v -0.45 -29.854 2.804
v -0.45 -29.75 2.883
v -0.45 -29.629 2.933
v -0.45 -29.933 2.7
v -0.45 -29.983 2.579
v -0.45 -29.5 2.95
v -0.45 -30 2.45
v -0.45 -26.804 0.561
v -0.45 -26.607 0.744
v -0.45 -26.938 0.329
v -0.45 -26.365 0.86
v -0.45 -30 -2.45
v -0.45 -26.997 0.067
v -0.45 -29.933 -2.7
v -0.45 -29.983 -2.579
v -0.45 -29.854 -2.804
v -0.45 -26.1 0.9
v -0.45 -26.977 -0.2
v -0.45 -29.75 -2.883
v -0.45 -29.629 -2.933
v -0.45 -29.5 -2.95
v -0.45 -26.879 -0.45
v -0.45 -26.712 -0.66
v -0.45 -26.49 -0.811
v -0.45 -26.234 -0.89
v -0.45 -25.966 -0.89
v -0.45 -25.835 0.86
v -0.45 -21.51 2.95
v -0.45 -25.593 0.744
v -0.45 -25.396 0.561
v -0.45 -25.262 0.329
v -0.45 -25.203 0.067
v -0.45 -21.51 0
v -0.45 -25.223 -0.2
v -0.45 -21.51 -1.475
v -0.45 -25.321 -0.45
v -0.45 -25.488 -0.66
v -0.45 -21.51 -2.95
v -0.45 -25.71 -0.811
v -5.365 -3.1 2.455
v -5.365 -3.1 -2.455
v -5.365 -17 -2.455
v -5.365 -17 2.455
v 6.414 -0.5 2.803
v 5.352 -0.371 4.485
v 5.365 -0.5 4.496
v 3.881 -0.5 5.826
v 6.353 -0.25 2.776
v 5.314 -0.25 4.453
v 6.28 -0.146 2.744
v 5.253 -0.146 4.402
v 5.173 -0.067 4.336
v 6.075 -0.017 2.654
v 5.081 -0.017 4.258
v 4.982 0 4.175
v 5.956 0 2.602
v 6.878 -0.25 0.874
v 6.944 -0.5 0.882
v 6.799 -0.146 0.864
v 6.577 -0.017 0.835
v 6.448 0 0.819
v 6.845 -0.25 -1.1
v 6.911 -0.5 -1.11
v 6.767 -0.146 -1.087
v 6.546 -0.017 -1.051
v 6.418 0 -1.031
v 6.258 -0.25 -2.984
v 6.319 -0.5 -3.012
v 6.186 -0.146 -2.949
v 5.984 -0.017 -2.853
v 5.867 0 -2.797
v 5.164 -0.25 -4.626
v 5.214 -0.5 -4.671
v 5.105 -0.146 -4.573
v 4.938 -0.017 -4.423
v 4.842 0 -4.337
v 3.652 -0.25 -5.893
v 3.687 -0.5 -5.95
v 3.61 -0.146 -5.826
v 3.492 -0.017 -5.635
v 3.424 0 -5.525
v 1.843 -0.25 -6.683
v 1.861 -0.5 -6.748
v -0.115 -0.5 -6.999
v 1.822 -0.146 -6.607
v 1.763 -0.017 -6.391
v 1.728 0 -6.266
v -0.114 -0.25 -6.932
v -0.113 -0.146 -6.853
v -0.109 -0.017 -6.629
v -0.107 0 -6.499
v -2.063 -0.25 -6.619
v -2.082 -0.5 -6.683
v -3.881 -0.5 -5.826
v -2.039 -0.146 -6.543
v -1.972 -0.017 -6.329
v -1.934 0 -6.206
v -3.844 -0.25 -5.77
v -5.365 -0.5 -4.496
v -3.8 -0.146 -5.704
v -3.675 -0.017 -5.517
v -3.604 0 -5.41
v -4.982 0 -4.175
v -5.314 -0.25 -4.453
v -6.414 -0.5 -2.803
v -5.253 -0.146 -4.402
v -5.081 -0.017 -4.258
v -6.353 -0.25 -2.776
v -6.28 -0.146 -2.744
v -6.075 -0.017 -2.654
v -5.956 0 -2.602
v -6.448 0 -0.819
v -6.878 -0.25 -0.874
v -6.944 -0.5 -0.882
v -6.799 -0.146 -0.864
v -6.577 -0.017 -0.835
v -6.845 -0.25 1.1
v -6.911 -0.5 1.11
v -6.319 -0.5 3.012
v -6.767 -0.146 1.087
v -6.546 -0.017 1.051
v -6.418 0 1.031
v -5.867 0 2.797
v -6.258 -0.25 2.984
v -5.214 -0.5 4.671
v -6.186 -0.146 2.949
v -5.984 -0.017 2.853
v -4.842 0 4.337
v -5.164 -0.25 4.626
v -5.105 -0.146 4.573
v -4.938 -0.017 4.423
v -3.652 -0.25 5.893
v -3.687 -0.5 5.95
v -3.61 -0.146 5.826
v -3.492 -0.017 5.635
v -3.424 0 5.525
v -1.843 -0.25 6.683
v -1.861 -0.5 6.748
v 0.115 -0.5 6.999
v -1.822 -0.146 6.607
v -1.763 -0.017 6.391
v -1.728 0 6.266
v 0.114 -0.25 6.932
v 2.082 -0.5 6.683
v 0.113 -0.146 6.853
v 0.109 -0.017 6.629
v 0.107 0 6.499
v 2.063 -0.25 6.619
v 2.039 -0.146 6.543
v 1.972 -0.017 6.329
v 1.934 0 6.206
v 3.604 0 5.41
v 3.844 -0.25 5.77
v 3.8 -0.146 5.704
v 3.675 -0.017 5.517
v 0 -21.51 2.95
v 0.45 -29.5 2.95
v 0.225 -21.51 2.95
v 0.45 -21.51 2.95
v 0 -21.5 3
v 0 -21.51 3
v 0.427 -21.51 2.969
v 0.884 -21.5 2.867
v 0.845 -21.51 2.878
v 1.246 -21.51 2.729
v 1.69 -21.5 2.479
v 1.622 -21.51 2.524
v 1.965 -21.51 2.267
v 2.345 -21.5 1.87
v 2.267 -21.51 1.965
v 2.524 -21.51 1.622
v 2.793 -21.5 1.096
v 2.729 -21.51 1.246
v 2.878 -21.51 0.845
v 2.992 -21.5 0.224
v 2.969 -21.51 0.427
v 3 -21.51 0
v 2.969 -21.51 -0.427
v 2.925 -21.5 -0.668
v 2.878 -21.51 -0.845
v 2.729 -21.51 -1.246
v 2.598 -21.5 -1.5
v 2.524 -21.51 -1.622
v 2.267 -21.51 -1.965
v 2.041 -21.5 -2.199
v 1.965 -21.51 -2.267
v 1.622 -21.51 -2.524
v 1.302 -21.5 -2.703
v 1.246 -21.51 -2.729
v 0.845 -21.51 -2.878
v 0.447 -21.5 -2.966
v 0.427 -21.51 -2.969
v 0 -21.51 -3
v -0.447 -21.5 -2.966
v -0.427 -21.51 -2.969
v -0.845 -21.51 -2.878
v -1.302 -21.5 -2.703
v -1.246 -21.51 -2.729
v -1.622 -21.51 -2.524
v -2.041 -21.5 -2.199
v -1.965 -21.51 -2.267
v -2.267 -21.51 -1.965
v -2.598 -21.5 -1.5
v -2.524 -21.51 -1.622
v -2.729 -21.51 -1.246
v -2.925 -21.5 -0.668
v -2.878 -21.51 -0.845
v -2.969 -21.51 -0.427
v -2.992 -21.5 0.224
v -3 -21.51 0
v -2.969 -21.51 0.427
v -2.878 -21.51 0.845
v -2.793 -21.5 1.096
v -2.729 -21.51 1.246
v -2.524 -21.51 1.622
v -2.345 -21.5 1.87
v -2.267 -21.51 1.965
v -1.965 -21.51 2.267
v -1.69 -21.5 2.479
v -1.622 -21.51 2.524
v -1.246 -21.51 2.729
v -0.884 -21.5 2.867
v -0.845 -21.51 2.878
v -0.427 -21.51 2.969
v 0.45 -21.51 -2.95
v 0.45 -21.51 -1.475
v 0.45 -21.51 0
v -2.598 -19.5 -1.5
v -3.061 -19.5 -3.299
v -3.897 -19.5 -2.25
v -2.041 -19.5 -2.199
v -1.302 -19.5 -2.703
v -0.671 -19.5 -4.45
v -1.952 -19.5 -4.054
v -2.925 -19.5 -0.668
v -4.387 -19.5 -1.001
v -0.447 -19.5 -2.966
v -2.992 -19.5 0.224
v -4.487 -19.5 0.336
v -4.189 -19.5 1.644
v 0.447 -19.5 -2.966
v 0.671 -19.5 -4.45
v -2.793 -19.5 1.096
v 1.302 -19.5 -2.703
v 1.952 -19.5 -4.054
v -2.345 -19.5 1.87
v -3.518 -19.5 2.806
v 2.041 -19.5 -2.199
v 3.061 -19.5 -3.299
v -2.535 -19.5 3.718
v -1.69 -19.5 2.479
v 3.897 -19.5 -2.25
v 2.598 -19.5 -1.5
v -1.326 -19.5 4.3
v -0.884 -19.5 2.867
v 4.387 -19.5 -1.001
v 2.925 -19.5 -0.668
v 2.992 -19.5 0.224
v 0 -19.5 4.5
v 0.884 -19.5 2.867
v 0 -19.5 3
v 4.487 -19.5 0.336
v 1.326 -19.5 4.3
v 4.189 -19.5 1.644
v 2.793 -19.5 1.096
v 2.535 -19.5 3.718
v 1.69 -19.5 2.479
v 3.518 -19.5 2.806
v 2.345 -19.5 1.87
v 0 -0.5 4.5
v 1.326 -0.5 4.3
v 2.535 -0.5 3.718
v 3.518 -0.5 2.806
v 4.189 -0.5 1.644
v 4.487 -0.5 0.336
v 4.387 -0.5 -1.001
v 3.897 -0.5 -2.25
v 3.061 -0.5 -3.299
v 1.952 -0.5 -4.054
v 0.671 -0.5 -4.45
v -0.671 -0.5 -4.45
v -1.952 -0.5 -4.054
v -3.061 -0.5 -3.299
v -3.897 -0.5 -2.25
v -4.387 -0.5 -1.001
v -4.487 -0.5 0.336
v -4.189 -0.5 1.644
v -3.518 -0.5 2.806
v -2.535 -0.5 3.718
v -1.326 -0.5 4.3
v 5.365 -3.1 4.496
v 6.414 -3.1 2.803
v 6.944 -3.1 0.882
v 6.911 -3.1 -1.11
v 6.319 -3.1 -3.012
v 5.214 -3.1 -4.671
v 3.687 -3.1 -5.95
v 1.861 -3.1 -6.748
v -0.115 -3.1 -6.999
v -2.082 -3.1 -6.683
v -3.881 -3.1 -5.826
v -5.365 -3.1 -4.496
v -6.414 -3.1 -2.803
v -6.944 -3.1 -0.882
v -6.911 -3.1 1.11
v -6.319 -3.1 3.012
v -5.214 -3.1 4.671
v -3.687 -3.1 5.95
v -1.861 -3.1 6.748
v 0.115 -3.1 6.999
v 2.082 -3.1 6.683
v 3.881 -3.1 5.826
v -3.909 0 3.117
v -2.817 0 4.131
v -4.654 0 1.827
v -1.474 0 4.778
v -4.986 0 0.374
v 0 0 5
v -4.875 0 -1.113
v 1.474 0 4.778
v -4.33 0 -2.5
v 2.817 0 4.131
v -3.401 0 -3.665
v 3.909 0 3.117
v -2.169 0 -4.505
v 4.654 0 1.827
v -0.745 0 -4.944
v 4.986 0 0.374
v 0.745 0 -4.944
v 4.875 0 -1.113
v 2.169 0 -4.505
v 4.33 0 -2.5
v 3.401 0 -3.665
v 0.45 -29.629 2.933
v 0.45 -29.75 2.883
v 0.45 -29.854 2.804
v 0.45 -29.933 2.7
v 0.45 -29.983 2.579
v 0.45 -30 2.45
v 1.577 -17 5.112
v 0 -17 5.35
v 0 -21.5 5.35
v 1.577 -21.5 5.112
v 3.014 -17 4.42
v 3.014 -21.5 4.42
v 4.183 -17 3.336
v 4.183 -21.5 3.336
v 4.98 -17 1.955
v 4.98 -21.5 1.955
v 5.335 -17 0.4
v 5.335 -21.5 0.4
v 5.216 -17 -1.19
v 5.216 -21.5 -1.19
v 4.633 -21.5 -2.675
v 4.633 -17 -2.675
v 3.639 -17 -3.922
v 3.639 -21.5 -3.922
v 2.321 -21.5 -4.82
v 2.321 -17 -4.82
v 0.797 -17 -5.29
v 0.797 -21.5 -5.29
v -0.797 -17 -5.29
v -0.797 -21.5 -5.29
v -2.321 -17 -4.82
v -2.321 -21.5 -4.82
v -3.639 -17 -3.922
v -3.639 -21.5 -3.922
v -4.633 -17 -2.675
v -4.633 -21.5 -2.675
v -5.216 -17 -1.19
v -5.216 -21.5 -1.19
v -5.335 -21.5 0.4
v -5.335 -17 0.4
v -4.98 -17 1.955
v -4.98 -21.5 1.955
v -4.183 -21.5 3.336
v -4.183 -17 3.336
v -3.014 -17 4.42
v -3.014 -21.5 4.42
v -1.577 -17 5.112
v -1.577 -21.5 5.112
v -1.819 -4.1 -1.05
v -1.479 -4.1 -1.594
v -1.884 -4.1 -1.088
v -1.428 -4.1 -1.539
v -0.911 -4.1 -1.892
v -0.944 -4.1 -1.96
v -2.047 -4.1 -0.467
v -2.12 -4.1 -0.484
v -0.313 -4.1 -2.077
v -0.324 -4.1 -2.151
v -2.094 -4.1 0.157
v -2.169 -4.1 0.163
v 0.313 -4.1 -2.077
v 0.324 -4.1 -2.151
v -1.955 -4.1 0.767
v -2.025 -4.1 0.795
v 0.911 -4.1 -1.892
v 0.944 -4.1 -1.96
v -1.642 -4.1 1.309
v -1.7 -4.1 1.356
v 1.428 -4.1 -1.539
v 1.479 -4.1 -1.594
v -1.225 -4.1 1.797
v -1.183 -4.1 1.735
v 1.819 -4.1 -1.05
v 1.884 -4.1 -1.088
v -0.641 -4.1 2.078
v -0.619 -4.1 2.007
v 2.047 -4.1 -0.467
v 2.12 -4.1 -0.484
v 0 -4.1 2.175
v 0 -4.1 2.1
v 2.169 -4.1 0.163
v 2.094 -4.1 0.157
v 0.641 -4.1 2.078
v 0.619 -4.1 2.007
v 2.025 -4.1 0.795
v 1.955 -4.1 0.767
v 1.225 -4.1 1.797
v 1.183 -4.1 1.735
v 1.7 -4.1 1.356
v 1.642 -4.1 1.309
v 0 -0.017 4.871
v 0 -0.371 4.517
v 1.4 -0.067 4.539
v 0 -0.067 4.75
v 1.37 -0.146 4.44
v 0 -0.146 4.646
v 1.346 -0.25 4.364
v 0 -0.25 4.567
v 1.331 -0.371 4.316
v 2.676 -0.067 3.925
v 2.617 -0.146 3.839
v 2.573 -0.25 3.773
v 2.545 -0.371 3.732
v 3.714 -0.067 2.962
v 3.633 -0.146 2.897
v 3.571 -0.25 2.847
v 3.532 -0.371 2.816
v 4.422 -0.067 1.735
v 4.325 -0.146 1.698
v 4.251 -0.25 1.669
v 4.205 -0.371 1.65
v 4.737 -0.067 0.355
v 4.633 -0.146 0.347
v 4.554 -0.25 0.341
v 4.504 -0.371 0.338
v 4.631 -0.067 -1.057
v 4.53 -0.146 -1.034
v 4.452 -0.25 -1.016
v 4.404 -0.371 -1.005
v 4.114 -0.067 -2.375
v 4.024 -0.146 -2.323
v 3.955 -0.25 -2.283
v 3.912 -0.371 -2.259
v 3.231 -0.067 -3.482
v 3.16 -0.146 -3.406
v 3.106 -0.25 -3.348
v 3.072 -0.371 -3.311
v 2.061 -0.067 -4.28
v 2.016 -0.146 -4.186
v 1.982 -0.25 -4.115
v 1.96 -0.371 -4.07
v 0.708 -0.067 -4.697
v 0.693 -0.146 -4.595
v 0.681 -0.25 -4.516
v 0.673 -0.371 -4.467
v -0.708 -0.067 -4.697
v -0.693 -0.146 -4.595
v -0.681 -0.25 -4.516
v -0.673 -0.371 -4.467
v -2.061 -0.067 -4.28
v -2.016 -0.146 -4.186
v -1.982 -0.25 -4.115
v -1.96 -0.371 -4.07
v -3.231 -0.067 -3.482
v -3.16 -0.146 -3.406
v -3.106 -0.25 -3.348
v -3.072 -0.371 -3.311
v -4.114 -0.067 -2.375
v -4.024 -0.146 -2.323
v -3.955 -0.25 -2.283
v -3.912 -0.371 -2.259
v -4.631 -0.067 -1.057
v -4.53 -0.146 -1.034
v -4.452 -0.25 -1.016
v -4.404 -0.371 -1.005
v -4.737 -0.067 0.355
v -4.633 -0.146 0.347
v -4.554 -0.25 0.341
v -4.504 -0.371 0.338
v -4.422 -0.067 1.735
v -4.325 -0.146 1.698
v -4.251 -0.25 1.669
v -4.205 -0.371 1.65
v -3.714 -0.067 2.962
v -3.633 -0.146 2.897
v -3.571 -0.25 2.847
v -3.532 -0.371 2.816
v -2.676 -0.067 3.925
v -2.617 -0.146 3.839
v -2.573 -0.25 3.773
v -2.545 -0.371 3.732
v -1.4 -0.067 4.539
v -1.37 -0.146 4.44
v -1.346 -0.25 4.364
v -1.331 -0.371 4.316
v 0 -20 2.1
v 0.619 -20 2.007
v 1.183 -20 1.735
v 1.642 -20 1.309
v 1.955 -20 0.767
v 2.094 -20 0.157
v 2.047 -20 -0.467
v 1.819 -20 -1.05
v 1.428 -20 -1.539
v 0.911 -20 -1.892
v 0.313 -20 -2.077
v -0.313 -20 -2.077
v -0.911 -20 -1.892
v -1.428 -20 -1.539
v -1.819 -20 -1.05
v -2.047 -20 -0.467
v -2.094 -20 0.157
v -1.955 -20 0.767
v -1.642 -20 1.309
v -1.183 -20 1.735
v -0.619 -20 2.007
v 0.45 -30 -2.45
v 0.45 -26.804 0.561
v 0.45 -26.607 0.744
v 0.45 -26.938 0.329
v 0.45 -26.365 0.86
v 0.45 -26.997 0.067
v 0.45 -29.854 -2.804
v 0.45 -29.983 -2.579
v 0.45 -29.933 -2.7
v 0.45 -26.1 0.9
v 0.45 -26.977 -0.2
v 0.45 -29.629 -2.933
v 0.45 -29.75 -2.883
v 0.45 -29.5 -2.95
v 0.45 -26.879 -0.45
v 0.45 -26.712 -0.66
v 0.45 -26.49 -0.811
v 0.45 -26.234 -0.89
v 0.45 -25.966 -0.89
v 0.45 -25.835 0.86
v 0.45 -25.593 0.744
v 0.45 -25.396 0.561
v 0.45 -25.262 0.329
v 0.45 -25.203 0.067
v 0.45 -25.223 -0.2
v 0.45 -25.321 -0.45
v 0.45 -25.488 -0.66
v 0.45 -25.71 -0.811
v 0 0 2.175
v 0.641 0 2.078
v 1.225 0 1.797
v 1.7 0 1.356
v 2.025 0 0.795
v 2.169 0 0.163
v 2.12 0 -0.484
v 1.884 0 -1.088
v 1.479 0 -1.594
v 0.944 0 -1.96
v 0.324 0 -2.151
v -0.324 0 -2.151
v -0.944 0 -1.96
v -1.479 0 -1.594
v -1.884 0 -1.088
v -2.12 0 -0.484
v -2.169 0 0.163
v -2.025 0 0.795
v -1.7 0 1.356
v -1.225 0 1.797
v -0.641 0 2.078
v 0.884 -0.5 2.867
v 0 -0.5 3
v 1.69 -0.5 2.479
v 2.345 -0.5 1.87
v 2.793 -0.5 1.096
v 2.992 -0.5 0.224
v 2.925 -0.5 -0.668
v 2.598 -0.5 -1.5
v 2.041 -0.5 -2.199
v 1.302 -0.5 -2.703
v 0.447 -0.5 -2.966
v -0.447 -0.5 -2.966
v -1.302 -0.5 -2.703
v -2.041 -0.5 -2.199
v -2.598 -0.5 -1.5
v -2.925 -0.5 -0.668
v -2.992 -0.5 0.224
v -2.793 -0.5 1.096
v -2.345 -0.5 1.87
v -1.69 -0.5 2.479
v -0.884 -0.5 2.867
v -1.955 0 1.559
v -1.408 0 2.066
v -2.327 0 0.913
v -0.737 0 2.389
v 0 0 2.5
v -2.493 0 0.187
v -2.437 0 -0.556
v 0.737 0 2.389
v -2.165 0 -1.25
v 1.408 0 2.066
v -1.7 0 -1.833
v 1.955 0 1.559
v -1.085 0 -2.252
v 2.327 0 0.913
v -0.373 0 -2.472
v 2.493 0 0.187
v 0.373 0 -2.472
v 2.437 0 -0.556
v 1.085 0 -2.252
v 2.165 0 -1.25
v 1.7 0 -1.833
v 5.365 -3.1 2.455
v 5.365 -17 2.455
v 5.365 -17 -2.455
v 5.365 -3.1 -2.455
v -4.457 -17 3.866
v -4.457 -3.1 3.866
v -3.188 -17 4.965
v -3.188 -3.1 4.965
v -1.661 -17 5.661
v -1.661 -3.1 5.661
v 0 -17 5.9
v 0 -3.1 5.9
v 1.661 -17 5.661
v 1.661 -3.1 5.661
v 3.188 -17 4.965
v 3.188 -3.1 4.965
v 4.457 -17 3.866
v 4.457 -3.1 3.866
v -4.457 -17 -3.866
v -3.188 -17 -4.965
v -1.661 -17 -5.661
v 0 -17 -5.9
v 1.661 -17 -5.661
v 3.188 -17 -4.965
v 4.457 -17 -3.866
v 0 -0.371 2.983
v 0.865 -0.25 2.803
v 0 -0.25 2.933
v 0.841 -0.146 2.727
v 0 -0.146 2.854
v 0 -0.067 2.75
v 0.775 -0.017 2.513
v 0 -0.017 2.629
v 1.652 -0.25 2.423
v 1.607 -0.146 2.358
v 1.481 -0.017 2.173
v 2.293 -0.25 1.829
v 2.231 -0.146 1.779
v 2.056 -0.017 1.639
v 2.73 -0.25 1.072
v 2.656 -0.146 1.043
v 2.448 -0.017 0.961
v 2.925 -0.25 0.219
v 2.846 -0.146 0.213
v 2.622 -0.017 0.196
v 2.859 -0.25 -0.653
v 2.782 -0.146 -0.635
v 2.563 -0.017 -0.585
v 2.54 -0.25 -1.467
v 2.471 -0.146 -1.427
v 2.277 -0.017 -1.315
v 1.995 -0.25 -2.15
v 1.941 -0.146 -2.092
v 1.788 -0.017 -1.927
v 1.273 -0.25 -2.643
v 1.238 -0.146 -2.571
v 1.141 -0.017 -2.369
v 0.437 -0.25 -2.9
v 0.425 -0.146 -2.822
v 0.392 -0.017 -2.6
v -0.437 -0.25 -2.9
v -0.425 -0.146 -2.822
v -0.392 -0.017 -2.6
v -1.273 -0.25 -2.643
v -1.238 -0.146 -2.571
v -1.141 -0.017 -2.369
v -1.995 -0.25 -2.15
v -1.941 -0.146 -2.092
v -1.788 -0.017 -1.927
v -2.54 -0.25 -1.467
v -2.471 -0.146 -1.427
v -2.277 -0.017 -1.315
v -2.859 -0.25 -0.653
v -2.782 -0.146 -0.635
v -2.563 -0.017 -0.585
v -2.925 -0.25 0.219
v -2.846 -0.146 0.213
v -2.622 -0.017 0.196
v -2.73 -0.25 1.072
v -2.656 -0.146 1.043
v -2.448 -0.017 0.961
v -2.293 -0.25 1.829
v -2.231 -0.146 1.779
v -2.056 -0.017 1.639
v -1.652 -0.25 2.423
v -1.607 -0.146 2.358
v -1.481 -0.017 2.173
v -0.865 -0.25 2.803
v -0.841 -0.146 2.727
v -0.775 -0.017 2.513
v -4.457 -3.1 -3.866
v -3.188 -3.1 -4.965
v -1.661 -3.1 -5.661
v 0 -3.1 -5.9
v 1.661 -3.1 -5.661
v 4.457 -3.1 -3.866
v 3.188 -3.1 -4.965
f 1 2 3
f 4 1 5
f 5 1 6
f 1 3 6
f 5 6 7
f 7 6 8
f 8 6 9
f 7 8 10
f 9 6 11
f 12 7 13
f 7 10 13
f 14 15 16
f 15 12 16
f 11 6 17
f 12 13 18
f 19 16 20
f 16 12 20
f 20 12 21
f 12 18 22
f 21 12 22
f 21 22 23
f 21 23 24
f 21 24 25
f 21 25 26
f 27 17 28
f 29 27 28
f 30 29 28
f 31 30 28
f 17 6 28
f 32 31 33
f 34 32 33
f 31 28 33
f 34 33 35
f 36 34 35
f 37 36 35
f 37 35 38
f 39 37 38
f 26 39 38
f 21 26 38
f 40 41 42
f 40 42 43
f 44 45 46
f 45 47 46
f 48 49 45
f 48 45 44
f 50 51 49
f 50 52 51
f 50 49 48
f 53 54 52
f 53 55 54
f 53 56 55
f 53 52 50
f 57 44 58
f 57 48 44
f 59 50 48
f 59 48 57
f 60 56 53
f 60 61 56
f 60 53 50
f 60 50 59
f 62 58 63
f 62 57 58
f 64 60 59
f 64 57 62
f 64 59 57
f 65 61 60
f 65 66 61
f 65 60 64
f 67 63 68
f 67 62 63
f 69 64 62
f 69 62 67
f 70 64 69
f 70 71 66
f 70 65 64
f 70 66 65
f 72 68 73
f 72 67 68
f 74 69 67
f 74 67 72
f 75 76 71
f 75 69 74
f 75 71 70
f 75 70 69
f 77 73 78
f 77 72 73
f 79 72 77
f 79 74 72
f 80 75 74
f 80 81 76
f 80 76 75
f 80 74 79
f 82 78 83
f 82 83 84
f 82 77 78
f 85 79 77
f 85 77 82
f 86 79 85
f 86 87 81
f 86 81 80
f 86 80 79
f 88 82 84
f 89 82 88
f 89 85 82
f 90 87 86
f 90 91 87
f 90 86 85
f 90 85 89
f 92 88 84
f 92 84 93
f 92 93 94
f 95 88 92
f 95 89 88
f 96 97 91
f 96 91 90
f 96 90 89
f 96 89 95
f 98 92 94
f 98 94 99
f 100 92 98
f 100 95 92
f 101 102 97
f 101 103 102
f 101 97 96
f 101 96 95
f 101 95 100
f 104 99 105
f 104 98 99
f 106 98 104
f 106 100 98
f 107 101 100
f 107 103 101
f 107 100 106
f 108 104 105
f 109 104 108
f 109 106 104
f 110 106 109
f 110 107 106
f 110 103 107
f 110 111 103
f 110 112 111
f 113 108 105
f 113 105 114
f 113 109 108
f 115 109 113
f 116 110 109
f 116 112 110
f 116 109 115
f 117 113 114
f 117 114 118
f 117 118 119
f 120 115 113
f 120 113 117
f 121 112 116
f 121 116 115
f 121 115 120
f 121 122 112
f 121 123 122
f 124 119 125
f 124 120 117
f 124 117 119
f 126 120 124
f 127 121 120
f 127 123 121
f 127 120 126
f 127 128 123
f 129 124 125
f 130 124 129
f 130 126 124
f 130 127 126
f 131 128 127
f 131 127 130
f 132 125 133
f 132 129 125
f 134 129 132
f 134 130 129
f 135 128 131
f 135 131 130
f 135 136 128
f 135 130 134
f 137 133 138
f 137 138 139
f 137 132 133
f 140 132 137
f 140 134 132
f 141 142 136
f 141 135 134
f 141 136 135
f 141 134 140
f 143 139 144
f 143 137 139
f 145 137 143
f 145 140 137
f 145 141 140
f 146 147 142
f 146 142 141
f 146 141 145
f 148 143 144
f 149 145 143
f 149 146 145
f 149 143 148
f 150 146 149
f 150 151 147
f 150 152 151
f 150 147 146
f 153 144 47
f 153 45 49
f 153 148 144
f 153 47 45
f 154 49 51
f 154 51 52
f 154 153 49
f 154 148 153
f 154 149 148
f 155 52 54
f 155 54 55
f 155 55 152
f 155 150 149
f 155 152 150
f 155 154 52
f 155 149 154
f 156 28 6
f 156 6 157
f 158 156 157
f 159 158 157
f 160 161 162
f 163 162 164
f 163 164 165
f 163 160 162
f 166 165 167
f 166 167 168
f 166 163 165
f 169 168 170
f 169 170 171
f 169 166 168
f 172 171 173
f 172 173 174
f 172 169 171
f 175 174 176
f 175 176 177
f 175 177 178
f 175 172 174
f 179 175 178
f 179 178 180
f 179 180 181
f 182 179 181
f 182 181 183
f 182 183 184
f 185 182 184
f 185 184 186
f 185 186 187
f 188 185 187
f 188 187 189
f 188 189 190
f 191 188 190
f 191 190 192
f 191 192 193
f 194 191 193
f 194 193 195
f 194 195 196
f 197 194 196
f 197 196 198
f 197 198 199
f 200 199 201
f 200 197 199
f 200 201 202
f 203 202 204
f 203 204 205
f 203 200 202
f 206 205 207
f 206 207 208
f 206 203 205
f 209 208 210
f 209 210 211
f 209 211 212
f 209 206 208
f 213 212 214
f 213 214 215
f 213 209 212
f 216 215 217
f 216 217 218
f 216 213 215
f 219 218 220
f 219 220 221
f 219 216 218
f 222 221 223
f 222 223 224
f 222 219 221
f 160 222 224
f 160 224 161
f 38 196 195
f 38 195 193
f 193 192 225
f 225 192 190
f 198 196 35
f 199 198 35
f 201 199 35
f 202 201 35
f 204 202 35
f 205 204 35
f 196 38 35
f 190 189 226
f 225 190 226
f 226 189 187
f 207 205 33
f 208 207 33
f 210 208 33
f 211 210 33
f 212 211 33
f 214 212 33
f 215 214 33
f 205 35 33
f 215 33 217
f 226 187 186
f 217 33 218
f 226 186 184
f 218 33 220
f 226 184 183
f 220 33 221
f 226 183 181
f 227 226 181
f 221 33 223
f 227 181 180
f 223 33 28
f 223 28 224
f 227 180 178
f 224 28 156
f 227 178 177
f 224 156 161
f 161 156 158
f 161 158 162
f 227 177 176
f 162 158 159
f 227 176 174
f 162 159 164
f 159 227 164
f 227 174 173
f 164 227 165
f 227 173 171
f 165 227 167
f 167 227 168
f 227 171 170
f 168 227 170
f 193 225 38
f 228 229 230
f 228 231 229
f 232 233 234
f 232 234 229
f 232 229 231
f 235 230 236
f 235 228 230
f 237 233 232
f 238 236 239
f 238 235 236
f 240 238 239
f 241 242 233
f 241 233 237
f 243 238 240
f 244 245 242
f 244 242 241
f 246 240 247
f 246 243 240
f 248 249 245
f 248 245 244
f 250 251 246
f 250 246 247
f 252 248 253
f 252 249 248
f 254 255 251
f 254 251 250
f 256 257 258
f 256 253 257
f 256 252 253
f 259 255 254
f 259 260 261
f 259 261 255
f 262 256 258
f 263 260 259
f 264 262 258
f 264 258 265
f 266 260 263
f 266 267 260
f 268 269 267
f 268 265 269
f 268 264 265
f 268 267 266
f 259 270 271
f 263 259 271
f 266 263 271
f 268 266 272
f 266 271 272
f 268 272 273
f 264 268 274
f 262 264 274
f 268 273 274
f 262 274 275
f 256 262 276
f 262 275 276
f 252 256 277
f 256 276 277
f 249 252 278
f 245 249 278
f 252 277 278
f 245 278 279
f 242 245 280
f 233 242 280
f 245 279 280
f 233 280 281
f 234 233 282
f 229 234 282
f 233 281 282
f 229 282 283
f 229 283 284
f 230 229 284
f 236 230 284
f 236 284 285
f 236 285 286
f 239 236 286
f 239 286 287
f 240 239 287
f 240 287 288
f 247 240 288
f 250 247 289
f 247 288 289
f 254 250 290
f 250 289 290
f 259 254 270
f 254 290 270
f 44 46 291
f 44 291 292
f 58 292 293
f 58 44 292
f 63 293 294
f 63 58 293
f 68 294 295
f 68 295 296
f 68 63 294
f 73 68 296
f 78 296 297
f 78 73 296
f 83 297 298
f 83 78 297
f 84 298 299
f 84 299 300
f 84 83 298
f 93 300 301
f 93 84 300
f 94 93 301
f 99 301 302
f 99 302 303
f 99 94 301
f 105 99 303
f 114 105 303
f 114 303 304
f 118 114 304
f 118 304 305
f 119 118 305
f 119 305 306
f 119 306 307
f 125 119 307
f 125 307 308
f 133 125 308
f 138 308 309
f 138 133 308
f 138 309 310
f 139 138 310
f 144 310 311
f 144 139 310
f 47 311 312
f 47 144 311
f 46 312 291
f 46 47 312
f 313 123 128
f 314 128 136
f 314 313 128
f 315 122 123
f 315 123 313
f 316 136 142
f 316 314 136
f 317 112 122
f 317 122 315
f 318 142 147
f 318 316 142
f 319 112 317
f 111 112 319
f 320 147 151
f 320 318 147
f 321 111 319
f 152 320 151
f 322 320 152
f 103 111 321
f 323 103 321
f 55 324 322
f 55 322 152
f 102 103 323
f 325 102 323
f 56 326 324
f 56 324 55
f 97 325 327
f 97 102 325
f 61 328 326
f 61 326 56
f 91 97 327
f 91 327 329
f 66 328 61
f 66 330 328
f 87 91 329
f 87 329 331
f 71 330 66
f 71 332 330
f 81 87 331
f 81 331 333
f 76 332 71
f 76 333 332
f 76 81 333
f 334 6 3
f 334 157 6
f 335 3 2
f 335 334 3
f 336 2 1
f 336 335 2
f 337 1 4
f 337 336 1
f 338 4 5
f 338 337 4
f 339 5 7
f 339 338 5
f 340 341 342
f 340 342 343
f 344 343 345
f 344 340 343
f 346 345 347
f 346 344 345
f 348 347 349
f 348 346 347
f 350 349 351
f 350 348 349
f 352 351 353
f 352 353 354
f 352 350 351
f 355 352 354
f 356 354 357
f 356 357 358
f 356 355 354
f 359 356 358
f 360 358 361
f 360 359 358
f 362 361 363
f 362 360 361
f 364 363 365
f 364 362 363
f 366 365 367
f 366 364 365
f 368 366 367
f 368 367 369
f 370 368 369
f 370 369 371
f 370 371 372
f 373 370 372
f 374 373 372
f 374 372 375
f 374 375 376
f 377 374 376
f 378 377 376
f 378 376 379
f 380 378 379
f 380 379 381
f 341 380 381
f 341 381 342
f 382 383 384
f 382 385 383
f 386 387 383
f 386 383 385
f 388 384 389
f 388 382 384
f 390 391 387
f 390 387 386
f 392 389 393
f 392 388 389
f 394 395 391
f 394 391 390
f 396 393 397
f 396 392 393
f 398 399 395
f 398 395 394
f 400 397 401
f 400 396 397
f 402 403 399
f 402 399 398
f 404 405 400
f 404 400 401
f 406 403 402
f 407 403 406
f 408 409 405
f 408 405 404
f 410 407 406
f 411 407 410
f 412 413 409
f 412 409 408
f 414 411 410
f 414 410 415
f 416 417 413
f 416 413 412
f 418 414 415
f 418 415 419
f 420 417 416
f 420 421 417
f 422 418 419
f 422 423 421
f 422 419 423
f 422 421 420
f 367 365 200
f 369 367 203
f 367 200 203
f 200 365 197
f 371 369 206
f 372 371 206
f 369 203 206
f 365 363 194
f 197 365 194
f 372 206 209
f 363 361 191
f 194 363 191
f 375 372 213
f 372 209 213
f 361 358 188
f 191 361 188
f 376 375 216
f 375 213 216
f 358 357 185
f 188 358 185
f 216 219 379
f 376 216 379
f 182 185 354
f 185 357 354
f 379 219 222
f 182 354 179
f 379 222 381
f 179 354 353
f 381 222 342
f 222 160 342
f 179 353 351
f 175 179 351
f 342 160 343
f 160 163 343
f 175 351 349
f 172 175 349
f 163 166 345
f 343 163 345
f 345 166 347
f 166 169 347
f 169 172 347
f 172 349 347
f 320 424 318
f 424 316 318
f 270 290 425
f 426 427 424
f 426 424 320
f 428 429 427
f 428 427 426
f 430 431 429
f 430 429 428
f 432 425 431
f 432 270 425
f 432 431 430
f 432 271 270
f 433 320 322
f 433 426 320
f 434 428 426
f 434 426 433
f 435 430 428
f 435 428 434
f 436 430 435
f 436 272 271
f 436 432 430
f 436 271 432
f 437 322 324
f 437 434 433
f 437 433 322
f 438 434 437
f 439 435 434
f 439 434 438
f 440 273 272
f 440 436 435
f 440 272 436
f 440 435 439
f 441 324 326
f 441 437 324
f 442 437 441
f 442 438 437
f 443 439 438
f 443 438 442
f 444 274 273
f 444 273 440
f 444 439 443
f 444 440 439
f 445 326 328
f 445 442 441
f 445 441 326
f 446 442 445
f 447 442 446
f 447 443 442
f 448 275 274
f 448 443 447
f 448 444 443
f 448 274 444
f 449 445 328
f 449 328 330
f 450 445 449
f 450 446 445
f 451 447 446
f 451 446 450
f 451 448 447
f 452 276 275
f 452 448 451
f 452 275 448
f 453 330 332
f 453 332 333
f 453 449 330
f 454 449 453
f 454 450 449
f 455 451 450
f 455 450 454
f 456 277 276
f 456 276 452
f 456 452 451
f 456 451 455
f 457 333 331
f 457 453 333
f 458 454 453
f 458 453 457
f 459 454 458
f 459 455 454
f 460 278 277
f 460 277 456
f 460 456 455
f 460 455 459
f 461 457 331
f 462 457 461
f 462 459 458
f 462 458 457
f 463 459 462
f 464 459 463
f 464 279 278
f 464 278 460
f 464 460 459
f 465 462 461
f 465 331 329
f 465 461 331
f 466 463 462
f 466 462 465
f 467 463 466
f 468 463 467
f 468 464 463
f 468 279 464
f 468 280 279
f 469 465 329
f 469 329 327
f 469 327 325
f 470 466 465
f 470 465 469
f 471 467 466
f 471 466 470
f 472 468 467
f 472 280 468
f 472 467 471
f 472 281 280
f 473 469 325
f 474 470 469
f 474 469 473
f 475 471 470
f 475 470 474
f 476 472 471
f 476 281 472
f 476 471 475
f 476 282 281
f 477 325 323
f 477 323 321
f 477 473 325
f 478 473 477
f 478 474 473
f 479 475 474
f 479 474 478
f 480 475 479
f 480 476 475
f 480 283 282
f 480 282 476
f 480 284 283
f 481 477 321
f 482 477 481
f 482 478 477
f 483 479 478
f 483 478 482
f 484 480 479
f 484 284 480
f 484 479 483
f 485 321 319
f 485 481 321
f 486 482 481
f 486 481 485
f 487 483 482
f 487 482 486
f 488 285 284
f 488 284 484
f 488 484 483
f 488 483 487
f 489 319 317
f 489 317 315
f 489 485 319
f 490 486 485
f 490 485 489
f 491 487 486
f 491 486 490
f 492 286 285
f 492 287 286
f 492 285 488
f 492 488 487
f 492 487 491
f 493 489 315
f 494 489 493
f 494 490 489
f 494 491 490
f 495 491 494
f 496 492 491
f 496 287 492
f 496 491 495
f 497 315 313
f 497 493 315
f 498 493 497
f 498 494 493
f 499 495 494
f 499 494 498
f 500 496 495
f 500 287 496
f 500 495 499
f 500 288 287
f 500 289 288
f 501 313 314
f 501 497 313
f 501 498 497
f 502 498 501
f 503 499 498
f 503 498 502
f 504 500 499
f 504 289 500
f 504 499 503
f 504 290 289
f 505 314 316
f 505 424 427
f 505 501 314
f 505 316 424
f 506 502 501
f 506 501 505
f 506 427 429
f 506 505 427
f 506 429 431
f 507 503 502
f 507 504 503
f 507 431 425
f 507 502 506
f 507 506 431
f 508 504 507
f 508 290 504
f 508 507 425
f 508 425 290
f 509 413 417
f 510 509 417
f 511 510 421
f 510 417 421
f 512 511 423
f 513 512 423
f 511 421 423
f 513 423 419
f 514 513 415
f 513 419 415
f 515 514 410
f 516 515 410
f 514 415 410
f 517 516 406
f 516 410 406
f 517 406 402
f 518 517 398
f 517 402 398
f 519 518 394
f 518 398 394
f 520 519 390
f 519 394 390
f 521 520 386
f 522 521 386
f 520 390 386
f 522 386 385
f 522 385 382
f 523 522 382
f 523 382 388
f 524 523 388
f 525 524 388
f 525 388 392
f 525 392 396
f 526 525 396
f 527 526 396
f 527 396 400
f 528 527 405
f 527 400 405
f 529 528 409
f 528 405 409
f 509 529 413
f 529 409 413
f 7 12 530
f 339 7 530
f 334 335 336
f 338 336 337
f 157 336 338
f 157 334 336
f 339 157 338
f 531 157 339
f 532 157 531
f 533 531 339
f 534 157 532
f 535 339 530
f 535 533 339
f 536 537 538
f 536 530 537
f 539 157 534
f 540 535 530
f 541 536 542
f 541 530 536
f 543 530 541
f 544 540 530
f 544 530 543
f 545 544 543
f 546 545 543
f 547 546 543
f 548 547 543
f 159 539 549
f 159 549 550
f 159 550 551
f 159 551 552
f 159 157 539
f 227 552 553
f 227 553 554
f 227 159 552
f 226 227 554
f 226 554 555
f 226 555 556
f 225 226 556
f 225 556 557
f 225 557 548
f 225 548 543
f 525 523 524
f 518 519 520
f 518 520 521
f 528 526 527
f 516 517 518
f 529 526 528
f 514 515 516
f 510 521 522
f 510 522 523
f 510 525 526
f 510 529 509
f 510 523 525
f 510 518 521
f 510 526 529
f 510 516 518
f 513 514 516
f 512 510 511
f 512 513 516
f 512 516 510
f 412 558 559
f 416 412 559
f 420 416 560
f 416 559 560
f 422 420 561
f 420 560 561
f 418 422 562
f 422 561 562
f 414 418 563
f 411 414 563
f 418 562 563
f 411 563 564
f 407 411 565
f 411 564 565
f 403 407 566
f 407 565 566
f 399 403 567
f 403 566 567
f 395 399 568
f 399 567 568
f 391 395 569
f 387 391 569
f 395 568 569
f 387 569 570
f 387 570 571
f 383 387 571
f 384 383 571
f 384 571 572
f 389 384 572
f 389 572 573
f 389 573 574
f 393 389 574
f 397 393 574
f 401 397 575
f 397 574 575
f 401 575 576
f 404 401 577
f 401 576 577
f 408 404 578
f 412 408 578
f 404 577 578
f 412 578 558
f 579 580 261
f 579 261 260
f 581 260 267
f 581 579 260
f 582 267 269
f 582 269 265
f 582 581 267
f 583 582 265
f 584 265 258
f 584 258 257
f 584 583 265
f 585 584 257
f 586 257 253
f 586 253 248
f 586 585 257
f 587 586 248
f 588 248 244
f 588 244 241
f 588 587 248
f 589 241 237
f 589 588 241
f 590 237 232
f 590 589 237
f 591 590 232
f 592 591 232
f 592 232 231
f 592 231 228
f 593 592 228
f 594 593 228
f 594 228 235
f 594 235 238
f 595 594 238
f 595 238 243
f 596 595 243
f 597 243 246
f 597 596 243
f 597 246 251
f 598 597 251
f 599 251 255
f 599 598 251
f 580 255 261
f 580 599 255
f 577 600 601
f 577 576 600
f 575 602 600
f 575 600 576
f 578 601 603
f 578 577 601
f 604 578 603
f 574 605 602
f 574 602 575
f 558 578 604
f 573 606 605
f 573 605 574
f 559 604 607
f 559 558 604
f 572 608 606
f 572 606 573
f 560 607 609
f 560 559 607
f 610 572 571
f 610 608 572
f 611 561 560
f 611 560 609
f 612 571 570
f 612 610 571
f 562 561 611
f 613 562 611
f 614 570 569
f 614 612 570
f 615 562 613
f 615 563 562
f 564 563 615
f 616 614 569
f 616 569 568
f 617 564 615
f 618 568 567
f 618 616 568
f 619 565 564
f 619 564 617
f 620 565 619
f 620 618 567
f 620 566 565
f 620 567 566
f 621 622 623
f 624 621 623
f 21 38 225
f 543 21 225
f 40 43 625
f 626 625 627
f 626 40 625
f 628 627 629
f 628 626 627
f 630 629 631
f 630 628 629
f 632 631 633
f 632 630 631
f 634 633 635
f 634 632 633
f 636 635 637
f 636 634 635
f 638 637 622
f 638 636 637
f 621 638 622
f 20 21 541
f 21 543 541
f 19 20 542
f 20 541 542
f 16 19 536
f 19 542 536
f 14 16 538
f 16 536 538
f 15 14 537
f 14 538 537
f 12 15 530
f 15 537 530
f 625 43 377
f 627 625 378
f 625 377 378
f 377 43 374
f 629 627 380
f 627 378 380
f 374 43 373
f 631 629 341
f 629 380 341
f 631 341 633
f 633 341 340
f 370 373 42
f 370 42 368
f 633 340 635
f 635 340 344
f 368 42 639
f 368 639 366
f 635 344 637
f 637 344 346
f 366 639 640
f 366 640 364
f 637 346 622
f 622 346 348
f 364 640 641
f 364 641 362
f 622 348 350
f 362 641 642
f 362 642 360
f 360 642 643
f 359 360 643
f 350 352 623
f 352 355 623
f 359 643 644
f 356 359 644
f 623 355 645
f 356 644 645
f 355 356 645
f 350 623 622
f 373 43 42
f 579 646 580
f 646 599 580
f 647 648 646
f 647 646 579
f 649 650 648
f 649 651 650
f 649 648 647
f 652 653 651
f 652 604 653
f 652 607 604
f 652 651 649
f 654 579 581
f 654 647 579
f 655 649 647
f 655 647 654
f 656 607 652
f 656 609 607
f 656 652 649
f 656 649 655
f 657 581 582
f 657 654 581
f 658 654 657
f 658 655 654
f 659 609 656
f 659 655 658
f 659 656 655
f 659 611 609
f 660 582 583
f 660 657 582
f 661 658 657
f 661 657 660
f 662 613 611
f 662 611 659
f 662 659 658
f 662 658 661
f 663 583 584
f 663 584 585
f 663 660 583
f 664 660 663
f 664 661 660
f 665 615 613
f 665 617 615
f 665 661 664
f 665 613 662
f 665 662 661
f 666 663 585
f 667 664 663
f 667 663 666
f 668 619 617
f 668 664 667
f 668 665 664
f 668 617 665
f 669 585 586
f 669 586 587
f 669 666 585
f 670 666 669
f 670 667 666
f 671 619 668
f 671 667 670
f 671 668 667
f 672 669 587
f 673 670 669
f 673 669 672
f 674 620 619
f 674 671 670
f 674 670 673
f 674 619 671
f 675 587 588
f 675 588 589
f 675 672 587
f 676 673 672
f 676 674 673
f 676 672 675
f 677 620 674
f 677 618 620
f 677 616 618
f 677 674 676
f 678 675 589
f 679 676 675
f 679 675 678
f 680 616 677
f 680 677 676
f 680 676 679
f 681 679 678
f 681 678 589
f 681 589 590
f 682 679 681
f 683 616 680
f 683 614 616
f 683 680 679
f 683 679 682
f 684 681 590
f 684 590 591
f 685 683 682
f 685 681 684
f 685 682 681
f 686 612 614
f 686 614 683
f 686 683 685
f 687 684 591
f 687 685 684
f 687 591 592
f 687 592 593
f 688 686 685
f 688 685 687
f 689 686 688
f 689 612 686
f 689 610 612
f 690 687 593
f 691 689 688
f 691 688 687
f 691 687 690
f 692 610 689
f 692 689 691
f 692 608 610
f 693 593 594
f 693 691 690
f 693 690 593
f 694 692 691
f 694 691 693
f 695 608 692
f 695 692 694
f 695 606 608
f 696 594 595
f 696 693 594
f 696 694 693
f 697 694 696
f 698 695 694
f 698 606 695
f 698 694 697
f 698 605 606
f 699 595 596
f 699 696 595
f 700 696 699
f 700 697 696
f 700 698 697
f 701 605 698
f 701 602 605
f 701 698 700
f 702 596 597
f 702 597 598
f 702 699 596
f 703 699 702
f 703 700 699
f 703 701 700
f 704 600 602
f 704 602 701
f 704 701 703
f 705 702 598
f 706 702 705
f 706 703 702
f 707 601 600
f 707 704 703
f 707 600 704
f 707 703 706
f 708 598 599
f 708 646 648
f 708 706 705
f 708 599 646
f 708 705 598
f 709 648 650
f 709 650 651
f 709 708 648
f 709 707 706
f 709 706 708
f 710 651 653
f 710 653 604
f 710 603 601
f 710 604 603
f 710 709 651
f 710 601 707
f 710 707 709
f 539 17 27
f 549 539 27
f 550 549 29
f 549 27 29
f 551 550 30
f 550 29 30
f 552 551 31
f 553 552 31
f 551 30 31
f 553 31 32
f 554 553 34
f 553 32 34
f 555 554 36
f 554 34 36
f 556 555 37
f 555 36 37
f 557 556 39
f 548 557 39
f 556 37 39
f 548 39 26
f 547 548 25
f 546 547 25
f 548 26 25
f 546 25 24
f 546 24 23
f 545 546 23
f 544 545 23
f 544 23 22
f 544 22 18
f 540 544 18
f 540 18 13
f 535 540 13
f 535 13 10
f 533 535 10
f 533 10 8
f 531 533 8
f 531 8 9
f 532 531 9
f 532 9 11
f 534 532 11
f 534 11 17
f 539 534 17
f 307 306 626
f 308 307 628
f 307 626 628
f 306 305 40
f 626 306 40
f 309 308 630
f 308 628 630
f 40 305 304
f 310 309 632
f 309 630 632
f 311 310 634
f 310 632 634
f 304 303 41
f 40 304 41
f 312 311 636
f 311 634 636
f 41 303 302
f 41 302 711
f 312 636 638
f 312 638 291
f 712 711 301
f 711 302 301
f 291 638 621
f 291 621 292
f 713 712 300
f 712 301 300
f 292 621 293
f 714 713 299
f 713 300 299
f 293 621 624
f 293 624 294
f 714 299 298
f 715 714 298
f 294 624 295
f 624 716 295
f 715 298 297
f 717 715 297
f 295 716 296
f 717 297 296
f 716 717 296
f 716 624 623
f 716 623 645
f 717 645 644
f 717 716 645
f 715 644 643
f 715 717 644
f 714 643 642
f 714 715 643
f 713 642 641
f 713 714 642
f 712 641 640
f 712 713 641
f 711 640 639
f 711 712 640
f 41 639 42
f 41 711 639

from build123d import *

# Parameters (mm, degrees)
SKETCH1_W           = 0.9
SKETCH1_H           = 5.9
BOSS_EXTRUDE1_DEPTH = 30
SKETCH1_3_R         = 3
SKETCH1_3_W         = 0.9
SKETCH1_3_H         = 5.9
BOSS_EXTRUDE2_DEPTH = 21.51
SKETCH1_4_R         = 5.35
SKETCH1_4_R_2       = 3
BOSS_EXTRUDE3_DEPTH = 21.5
SKETCH1_5_R         = 5.35
BOSS_EXTRUDE4_DEPTH = 17
SKETCH1_6_R         = 7
BOSS_EXTRUDE5_DEPTH = 3.1
SKETCH2_R           = 4.5
SKETCH2_R_2         = 3
CUT_EXTRUDE1_DEPTH  = 19.5
SKETCH3_R           = 2.175
CUT_EXTRUDE2_DEPTH  = 4.1
SKETCH4_R           = 2.1
CUT_EXTRUDE3_DEPTH  = 15.9
SKETCH5_R           = 0.9
CUT_EXTRUDE4_DEPTH  = 32.693887423
FILLET1_R           = 0.5


with BuildPart() as part:
    # Sketch1 → Boss-Extrude1 (new body)
    with BuildSketch(Plane(origin=(0, 0, 0), x_dir=(1, 0, 0), z_dir=(0, 1, 0))):
        Rectangle(SKETCH1_W, SKETCH1_H)
    extrude(amount=-BOSS_EXTRUDE1_DEPTH)

    # Sketch1<3> → Boss-Extrude2 (add)
    with BuildSketch(Plane(origin=(0, 0, 0), x_dir=(1, 0, 0), z_dir=(0, 1, 0))):
        Circle(SKETCH1_3_R)
        Rectangle(SKETCH1_3_W, SKETCH1_3_H, mode=Mode.SUBTRACT)
    extrude(amount=-BOSS_EXTRUDE2_DEPTH)

    # Sketch1<4> → Boss-Extrude3 (add)
    with BuildSketch(Plane(origin=(0, 0, 0), x_dir=(1, 0, 0), z_dir=(0, 1, 0))):
        Circle(SKETCH1_4_R)
        Circle(SKETCH1_4_R_2, mode=Mode.SUBTRACT)
    extrude(amount=-BOSS_EXTRUDE3_DEPTH)

    # Sketch1<5> → Boss-Extrude4 (add)
    with BuildSketch(Plane(origin=(0, 0, 0), x_dir=(1, 0, 0), z_dir=(0, 1, 0))):
        with BuildLine():
            ThreePointArc((-5.365, -2.454949083), (0, -5.9), (5.365, -2.454949083))
            Line((5.365, -2.454949083), (5.365, 2.454949083))
            ThreePointArc((5.365, 2.454949083), (0, 5.9), (-5.365, 2.454949083))
            Line((-5.365, 2.454949083), (-5.365, -2.454949083))
        make_face()
        Circle(SKETCH1_5_R, mode=Mode.SUBTRACT)
    extrude(amount=-BOSS_EXTRUDE4_DEPTH)

    # Sketch1<6> → Boss-Extrude5 (add)
    with BuildSketch(Plane(origin=(0, 0, 0), x_dir=(1, 0, 0), z_dir=(0, 1, 0))):
        Circle(SKETCH1_6_R)
        with BuildLine():
            ThreePointArc((5.365, -2.454949083), (0, -5.9), (-5.365, -2.454949083))
            Line((-5.365, -2.454949083), (-5.365, 2.454949083))
            ThreePointArc((-5.365, 2.454949083), (0, 5.9), (5.365, 2.454949083))
            Line((5.365, 2.454949083), (5.365, -2.454949083))
        make_face(mode=Mode.SUBTRACT)
    extrude(amount=-BOSS_EXTRUDE5_DEPTH)

    # Sketch2 → Cut-Extrude1 (cut)
    with BuildSketch(Plane(origin=(0, 0, 0), x_dir=(1, 0, 0), z_dir=(0, 1, 0))):
        Circle(SKETCH2_R)
        Circle(SKETCH2_R_2, mode=Mode.SUBTRACT)
    extrude(amount=-CUT_EXTRUDE1_DEPTH, mode=Mode.SUBTRACT)

    # Sketch3 → Cut-Extrude2 (cut)
    with BuildSketch(Plane(origin=(0, 0, 0), x_dir=(1, 0, 0), z_dir=(0, 1, 0))):
        Circle(SKETCH3_R)
    extrude(amount=-CUT_EXTRUDE2_DEPTH, mode=Mode.SUBTRACT)

    # Sketch4 → Cut-Extrude3 (cut)
    with BuildSketch(Plane(origin=(0, -4.1, 0), x_dir=(1, 0, 0), z_dir=(0, 1, 0))):
        Circle(SKETCH4_R)
    extrude(amount=-CUT_EXTRUDE3_DEPTH, mode=Mode.SUBTRACT)

    # Sketch5 → Cut-Extrude4 (cut, through all)
    with BuildSketch(Plane.ZY.offset(0.45)):
        with Locations((0, -26.1)):
            Circle(SKETCH5_R)
    extrude(amount=-CUT_EXTRUDE4_DEPTH, mode=Mode.SUBTRACT)

    # Fillet1
    fillet1_edges = [part.edges().sort_by_distance(p)[0] for p in [
        (-3, 0, 0),
        (-4.5, 0, 0),
        (-7, 0, 0),
        (0, -30, 2.95),
        (0, -30, -2.95),
    ]]
    fillet(fillet1_edges, radius=FILLET1_R)


solid = part.part
